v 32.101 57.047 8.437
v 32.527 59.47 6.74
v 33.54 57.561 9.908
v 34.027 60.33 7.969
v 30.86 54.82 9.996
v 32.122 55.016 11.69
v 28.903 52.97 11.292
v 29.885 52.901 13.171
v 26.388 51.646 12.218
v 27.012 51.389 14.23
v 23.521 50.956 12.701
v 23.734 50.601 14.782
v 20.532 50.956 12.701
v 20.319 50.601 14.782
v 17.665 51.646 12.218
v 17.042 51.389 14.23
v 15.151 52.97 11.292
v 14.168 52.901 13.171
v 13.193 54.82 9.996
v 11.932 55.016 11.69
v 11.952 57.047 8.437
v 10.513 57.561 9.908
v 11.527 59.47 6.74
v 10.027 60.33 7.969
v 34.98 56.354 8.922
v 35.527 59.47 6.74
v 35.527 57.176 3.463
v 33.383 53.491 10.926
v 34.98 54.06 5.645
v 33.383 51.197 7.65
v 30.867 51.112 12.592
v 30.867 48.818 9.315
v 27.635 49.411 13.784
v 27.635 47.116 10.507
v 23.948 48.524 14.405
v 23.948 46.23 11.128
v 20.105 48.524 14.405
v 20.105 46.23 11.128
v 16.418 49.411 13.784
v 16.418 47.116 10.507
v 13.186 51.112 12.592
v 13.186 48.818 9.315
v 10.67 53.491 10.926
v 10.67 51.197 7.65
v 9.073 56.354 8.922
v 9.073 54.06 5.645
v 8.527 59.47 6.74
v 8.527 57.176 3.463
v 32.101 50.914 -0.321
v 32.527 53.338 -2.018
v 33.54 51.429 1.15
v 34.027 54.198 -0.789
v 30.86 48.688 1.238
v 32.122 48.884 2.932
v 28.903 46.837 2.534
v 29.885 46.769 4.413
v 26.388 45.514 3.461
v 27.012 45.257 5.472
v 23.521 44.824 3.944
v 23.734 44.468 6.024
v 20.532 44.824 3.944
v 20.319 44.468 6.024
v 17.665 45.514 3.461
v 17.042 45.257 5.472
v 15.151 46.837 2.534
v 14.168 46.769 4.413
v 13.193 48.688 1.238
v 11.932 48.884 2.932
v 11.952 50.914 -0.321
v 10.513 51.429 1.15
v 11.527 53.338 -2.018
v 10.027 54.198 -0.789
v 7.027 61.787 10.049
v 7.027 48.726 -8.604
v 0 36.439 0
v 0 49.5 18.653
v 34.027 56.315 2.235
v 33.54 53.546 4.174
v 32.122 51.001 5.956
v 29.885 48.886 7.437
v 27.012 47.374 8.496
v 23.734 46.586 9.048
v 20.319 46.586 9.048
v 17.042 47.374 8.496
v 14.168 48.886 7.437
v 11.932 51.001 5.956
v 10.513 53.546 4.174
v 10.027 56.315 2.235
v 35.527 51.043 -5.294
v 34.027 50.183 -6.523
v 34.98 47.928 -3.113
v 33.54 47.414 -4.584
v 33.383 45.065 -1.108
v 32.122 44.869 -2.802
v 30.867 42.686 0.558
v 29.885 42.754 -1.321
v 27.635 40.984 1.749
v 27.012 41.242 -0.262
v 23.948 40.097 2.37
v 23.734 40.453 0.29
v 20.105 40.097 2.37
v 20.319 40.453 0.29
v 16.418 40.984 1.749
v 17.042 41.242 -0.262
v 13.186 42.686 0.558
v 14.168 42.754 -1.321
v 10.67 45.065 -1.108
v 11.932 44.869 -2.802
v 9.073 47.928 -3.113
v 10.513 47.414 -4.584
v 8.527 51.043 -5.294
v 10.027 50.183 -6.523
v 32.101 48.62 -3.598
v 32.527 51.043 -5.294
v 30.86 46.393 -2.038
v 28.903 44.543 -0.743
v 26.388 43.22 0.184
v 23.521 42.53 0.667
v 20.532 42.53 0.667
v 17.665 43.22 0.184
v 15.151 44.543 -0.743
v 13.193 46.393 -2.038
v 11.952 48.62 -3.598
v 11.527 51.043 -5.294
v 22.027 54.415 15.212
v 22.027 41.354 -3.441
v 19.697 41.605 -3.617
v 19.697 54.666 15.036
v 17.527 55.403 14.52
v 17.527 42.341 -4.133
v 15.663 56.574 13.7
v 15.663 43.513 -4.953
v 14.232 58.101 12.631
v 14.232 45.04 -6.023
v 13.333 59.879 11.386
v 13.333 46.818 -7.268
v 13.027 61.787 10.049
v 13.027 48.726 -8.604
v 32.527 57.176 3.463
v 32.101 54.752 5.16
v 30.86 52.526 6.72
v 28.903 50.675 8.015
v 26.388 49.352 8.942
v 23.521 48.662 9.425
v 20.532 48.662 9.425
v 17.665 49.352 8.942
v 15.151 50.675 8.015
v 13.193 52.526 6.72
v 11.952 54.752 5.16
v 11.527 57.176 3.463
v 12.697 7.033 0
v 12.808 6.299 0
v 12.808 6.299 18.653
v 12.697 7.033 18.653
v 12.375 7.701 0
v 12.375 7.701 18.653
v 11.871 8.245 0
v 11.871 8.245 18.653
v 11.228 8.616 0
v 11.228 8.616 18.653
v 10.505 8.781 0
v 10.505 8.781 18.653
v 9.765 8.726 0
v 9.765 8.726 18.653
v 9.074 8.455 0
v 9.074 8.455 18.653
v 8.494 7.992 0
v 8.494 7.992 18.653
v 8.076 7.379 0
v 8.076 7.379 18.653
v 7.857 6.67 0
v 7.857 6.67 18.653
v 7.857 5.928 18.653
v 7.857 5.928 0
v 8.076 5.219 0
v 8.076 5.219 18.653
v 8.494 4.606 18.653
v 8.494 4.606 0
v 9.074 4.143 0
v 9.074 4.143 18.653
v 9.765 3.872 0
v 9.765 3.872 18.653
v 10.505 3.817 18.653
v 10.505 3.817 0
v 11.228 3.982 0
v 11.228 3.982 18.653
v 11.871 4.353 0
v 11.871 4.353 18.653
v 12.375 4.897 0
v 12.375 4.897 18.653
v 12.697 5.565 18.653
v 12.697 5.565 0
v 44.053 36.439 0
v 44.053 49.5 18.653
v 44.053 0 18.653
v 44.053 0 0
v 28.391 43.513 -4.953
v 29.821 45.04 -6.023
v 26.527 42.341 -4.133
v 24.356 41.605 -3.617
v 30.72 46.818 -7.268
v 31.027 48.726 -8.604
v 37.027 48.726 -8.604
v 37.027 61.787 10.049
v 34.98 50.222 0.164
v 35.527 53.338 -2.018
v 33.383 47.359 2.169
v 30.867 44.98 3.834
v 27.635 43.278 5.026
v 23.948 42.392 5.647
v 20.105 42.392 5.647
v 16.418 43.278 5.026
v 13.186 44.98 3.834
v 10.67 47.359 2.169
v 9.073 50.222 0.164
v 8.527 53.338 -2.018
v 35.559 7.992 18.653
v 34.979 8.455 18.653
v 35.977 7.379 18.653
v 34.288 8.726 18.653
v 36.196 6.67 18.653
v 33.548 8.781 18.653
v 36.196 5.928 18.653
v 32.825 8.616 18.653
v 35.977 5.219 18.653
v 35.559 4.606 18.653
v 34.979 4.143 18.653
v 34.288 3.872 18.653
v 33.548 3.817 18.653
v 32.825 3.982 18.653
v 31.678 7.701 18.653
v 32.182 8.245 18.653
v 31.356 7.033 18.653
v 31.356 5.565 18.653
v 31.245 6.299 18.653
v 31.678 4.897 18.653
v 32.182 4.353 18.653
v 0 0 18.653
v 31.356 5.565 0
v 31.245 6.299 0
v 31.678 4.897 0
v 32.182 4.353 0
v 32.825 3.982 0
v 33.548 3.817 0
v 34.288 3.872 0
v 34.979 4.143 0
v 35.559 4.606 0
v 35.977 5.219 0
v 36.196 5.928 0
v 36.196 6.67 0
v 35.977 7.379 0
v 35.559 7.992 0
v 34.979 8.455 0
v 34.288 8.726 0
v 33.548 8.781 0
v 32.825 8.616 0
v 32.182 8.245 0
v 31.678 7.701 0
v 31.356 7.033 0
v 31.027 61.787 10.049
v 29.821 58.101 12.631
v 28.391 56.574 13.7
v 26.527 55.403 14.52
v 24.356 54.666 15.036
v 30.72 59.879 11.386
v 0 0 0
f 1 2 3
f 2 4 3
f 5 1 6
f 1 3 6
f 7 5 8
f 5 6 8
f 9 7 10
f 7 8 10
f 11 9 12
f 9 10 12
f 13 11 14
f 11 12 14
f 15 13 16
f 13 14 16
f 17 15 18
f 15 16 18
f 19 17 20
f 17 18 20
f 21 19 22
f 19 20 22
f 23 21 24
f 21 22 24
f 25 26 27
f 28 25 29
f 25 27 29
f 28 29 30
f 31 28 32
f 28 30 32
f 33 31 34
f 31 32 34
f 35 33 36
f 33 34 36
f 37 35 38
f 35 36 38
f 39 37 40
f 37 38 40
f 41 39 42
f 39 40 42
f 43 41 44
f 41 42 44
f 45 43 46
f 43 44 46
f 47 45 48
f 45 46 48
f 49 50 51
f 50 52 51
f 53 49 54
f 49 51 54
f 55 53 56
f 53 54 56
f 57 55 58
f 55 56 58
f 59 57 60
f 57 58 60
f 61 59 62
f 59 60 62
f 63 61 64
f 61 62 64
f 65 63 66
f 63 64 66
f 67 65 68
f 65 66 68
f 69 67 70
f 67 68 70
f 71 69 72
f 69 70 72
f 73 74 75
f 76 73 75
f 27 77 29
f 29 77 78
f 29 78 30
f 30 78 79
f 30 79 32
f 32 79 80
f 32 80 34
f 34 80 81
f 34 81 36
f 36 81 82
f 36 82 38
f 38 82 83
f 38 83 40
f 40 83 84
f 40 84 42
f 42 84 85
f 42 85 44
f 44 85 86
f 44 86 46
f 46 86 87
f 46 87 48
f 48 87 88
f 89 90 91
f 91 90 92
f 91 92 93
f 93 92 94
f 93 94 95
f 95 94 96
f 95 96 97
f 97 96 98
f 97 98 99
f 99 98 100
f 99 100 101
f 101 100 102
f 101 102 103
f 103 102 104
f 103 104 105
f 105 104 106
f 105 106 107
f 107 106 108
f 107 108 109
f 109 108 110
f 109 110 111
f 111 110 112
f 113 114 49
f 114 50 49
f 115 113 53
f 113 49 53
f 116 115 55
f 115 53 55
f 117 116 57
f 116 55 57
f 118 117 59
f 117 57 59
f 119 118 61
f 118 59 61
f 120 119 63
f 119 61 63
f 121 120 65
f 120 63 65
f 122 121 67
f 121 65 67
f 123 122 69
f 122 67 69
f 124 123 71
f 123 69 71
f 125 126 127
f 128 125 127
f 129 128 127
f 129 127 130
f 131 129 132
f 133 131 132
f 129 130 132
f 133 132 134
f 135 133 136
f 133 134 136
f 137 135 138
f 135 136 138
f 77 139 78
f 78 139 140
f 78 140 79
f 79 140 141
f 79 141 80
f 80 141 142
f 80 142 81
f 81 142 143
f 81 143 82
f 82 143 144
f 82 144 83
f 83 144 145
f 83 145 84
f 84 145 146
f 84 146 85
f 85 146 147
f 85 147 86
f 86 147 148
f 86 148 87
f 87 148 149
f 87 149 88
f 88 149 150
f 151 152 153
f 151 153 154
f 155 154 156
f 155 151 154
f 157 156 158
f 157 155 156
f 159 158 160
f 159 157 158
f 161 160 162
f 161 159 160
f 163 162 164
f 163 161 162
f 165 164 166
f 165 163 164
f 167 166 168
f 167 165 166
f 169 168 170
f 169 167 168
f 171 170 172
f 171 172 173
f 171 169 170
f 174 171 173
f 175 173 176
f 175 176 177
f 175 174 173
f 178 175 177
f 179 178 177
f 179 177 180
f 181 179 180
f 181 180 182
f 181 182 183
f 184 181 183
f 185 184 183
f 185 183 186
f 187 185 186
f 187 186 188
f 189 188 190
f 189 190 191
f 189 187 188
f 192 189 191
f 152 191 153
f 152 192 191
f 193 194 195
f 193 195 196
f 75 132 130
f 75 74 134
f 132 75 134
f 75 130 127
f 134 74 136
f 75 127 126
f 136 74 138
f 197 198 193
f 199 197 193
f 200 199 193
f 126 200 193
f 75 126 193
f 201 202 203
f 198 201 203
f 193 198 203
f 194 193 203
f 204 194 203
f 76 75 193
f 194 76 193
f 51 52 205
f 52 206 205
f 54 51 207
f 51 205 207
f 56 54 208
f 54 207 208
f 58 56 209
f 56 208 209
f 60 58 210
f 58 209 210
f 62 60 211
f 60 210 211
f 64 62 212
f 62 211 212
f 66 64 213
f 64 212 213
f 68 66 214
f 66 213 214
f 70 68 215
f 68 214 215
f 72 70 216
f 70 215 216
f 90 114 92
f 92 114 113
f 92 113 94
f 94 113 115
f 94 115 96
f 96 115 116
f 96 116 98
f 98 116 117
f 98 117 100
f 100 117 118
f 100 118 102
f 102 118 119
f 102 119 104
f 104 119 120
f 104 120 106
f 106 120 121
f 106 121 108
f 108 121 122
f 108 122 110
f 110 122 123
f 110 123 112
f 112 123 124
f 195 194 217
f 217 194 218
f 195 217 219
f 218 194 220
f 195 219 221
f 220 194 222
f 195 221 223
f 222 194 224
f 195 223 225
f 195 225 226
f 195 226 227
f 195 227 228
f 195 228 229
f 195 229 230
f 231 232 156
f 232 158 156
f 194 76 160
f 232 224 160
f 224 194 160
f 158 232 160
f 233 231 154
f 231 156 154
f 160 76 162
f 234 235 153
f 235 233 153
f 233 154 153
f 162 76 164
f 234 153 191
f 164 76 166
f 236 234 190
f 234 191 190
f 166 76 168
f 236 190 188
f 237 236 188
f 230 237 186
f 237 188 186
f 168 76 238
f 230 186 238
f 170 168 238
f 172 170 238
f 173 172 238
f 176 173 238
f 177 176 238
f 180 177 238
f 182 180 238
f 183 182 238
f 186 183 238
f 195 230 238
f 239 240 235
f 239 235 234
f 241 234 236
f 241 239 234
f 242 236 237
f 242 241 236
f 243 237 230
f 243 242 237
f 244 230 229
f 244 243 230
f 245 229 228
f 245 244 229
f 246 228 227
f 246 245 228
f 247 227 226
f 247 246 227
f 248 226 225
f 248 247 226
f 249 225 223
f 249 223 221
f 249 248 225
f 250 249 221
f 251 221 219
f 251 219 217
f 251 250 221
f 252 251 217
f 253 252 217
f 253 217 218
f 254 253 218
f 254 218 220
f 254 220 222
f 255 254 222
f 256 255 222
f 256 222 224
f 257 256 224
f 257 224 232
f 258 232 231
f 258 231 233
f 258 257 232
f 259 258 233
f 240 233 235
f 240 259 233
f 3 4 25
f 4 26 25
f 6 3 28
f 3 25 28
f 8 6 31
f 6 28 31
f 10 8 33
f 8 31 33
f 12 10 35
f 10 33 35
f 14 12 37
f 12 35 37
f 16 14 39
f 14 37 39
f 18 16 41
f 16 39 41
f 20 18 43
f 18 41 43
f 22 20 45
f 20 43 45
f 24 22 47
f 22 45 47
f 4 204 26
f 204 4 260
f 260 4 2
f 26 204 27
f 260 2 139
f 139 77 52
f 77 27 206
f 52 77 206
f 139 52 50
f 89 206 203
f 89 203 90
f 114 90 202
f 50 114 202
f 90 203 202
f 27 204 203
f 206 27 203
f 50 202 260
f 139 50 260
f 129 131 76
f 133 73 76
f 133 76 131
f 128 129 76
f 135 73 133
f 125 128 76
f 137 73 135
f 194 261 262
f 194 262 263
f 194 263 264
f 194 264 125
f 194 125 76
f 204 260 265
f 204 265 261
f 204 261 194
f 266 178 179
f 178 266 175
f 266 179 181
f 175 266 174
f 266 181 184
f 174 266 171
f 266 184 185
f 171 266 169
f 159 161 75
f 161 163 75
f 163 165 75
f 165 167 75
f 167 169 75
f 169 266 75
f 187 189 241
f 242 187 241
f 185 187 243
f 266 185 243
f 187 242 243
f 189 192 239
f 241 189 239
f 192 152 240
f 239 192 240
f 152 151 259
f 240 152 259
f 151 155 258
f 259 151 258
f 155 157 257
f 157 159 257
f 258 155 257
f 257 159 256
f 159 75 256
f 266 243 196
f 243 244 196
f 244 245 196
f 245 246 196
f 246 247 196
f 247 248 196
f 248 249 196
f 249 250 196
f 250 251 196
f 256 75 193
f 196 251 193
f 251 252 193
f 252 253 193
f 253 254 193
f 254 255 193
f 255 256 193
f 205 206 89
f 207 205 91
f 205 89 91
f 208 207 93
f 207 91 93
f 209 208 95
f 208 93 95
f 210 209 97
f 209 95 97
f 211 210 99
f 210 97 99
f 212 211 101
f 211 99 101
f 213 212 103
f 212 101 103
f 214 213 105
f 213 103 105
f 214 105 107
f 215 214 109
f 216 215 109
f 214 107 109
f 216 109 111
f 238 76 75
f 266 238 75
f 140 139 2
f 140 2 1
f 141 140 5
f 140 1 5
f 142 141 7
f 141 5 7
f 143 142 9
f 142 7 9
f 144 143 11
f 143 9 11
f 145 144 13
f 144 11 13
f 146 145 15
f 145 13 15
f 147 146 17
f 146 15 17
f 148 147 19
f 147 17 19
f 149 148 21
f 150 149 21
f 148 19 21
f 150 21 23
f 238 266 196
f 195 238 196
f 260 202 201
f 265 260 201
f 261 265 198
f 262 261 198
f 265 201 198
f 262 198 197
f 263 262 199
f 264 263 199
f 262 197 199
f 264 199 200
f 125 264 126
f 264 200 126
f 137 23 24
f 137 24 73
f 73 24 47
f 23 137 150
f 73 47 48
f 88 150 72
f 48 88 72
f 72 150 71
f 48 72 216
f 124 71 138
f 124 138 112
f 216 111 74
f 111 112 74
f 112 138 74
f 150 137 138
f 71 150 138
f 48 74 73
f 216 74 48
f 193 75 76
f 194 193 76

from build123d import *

# Parameters (mm, degrees)
CROQUIS1_W              = 44.053125
CROQUIS1_H              = 36.438869972
CROQUIS1_R              = 2.4892
SALIENTE_EXTRUIR1_DEPTH = 18.653125
SALIENTE_EXTRUIR2_DEPTH = 44.053125
SALIENTE_EXTRUIR3_DEPTH = 22.771261


with BuildPart() as part:
    # Croquis1 → Saliente-Extruir1 (new body)
    with BuildSketch(Plane.XY):
        with Locations((22.0265625, 18.219434986)):
            Rectangle(CROQUIS1_W, CROQUIS1_H)
        with Locations((10.31875, 6.2992)):
            Circle(CROQUIS1_R, mode=Mode.SUBTRACT)
        with Locations(Location((33.734375, 6.2992, 0), (0, 0, 180))):
            Circle(CROQUIS1_R, mode=Mode.SUBTRACT)
    extrude(amount=SALIENTE_EXTRUIR1_DEPTH)

    # Croquis3 → Saliente-Extruir2 (add)
    with BuildSketch(Plane.ZY):
        Polygon((0, 36.438869972), (18.653125, 49.499928708), (18.653125, 36.438869972), align=None)
    extrude(amount=-SALIENTE_EXTRUIR2_DEPTH)


with BuildPart() as body_2:
    # Croquis5 → Saliente-Extruir3 (new body)
    with BuildSketch(Plane(origin=(0, 11.988021221, 17.120668611), x_dir=(1, 0, 0), z_dir=(0, 0.5735764363510476, 0.8191520442889909))):
        with BuildLine():
            ThreePointArc((7.0265625, 44.848974829), (11.419960782, 34.242373111), (22.0265625, 29.848974829))
            Line((22.0265625, 29.848974829), (22.0265625, 35.848974829))
            ThreePointArc((22.0265625, 35.848974829), (15.662601469, 38.485013798), (13.0265625, 44.848974829))
            Line((13.0265625, 44.848974829), (7.0265625, 44.848974829))
        make_face()
        with BuildLine():
            Line((22.0265625, 35.848974829), (22.0265625, 29.848974829))
            ThreePointArc((22.0265625, 29.848974829), (32.633164218, 34.242373111), (37.0265625, 44.848974829))
            Line((37.0265625, 44.848974829), (31.0265625, 44.848974829))
            ThreePointArc((31.0265625, 44.848974829), (28.390523531, 38.485013798), (22.0265625, 35.848974829))
        make_face()
        with BuildLine():
            Line((0, 29.848974829), (22.0265625, 29.848974829))
            ThreePointArc((22.0265625, 29.848974829), (11.419960782, 34.242373111), (7.0265625, 44.848974829))
            Line((7.0265625, 44.848974829), (0, 29.848974829))
        make_face()
        with BuildLine():
            ThreePointArc((37.0265625, 44.848974829), (32.633164218, 34.242373111), (22.0265625, 29.848974829))
            Line((22.0265625, 29.848974829), (44.053125, 29.848974829))
            Line((44.053125, 29.848974829), (37.0265625, 44.848974829))
        make_face()
    extrude(amount=SALIENTE_EXTRUIR3_DEPTH)

    # Croquis7 → Cortar-Revolución1 (revolve, cut)
    with BuildSketch(Plane(origin=(0, 36.738129416, -25.724315156), x_dir=(1, 0, 0), z_dir=(0, 0.8191520442889908, -0.5735764363510477))):
        Polygon((8.5265625, -28.940477183), (8.5265625, -24.940477183), (10.0265625, -23.440477183), (11.5265625, -24.940477183), (11.5265625, -28.940477183), (10.0265625, -30.440477183), align=None)
        Polygon((10.0265625, -41.131738184), (8.5265625, -39.631738184), (8.5265625, -35.631738184), (10.0265625, -34.131738184), (11.5265625, -35.631738184), (11.5265625, -39.631738184), align=None)
    revolve(axis=Axis((22.0265625, 61.787209373, 10.049478455), (0, -0.5735764363510466, -0.8191520442889915)), mode=Mode.SUBTRACT)


solid = Compound([part.part, body_2.part])
